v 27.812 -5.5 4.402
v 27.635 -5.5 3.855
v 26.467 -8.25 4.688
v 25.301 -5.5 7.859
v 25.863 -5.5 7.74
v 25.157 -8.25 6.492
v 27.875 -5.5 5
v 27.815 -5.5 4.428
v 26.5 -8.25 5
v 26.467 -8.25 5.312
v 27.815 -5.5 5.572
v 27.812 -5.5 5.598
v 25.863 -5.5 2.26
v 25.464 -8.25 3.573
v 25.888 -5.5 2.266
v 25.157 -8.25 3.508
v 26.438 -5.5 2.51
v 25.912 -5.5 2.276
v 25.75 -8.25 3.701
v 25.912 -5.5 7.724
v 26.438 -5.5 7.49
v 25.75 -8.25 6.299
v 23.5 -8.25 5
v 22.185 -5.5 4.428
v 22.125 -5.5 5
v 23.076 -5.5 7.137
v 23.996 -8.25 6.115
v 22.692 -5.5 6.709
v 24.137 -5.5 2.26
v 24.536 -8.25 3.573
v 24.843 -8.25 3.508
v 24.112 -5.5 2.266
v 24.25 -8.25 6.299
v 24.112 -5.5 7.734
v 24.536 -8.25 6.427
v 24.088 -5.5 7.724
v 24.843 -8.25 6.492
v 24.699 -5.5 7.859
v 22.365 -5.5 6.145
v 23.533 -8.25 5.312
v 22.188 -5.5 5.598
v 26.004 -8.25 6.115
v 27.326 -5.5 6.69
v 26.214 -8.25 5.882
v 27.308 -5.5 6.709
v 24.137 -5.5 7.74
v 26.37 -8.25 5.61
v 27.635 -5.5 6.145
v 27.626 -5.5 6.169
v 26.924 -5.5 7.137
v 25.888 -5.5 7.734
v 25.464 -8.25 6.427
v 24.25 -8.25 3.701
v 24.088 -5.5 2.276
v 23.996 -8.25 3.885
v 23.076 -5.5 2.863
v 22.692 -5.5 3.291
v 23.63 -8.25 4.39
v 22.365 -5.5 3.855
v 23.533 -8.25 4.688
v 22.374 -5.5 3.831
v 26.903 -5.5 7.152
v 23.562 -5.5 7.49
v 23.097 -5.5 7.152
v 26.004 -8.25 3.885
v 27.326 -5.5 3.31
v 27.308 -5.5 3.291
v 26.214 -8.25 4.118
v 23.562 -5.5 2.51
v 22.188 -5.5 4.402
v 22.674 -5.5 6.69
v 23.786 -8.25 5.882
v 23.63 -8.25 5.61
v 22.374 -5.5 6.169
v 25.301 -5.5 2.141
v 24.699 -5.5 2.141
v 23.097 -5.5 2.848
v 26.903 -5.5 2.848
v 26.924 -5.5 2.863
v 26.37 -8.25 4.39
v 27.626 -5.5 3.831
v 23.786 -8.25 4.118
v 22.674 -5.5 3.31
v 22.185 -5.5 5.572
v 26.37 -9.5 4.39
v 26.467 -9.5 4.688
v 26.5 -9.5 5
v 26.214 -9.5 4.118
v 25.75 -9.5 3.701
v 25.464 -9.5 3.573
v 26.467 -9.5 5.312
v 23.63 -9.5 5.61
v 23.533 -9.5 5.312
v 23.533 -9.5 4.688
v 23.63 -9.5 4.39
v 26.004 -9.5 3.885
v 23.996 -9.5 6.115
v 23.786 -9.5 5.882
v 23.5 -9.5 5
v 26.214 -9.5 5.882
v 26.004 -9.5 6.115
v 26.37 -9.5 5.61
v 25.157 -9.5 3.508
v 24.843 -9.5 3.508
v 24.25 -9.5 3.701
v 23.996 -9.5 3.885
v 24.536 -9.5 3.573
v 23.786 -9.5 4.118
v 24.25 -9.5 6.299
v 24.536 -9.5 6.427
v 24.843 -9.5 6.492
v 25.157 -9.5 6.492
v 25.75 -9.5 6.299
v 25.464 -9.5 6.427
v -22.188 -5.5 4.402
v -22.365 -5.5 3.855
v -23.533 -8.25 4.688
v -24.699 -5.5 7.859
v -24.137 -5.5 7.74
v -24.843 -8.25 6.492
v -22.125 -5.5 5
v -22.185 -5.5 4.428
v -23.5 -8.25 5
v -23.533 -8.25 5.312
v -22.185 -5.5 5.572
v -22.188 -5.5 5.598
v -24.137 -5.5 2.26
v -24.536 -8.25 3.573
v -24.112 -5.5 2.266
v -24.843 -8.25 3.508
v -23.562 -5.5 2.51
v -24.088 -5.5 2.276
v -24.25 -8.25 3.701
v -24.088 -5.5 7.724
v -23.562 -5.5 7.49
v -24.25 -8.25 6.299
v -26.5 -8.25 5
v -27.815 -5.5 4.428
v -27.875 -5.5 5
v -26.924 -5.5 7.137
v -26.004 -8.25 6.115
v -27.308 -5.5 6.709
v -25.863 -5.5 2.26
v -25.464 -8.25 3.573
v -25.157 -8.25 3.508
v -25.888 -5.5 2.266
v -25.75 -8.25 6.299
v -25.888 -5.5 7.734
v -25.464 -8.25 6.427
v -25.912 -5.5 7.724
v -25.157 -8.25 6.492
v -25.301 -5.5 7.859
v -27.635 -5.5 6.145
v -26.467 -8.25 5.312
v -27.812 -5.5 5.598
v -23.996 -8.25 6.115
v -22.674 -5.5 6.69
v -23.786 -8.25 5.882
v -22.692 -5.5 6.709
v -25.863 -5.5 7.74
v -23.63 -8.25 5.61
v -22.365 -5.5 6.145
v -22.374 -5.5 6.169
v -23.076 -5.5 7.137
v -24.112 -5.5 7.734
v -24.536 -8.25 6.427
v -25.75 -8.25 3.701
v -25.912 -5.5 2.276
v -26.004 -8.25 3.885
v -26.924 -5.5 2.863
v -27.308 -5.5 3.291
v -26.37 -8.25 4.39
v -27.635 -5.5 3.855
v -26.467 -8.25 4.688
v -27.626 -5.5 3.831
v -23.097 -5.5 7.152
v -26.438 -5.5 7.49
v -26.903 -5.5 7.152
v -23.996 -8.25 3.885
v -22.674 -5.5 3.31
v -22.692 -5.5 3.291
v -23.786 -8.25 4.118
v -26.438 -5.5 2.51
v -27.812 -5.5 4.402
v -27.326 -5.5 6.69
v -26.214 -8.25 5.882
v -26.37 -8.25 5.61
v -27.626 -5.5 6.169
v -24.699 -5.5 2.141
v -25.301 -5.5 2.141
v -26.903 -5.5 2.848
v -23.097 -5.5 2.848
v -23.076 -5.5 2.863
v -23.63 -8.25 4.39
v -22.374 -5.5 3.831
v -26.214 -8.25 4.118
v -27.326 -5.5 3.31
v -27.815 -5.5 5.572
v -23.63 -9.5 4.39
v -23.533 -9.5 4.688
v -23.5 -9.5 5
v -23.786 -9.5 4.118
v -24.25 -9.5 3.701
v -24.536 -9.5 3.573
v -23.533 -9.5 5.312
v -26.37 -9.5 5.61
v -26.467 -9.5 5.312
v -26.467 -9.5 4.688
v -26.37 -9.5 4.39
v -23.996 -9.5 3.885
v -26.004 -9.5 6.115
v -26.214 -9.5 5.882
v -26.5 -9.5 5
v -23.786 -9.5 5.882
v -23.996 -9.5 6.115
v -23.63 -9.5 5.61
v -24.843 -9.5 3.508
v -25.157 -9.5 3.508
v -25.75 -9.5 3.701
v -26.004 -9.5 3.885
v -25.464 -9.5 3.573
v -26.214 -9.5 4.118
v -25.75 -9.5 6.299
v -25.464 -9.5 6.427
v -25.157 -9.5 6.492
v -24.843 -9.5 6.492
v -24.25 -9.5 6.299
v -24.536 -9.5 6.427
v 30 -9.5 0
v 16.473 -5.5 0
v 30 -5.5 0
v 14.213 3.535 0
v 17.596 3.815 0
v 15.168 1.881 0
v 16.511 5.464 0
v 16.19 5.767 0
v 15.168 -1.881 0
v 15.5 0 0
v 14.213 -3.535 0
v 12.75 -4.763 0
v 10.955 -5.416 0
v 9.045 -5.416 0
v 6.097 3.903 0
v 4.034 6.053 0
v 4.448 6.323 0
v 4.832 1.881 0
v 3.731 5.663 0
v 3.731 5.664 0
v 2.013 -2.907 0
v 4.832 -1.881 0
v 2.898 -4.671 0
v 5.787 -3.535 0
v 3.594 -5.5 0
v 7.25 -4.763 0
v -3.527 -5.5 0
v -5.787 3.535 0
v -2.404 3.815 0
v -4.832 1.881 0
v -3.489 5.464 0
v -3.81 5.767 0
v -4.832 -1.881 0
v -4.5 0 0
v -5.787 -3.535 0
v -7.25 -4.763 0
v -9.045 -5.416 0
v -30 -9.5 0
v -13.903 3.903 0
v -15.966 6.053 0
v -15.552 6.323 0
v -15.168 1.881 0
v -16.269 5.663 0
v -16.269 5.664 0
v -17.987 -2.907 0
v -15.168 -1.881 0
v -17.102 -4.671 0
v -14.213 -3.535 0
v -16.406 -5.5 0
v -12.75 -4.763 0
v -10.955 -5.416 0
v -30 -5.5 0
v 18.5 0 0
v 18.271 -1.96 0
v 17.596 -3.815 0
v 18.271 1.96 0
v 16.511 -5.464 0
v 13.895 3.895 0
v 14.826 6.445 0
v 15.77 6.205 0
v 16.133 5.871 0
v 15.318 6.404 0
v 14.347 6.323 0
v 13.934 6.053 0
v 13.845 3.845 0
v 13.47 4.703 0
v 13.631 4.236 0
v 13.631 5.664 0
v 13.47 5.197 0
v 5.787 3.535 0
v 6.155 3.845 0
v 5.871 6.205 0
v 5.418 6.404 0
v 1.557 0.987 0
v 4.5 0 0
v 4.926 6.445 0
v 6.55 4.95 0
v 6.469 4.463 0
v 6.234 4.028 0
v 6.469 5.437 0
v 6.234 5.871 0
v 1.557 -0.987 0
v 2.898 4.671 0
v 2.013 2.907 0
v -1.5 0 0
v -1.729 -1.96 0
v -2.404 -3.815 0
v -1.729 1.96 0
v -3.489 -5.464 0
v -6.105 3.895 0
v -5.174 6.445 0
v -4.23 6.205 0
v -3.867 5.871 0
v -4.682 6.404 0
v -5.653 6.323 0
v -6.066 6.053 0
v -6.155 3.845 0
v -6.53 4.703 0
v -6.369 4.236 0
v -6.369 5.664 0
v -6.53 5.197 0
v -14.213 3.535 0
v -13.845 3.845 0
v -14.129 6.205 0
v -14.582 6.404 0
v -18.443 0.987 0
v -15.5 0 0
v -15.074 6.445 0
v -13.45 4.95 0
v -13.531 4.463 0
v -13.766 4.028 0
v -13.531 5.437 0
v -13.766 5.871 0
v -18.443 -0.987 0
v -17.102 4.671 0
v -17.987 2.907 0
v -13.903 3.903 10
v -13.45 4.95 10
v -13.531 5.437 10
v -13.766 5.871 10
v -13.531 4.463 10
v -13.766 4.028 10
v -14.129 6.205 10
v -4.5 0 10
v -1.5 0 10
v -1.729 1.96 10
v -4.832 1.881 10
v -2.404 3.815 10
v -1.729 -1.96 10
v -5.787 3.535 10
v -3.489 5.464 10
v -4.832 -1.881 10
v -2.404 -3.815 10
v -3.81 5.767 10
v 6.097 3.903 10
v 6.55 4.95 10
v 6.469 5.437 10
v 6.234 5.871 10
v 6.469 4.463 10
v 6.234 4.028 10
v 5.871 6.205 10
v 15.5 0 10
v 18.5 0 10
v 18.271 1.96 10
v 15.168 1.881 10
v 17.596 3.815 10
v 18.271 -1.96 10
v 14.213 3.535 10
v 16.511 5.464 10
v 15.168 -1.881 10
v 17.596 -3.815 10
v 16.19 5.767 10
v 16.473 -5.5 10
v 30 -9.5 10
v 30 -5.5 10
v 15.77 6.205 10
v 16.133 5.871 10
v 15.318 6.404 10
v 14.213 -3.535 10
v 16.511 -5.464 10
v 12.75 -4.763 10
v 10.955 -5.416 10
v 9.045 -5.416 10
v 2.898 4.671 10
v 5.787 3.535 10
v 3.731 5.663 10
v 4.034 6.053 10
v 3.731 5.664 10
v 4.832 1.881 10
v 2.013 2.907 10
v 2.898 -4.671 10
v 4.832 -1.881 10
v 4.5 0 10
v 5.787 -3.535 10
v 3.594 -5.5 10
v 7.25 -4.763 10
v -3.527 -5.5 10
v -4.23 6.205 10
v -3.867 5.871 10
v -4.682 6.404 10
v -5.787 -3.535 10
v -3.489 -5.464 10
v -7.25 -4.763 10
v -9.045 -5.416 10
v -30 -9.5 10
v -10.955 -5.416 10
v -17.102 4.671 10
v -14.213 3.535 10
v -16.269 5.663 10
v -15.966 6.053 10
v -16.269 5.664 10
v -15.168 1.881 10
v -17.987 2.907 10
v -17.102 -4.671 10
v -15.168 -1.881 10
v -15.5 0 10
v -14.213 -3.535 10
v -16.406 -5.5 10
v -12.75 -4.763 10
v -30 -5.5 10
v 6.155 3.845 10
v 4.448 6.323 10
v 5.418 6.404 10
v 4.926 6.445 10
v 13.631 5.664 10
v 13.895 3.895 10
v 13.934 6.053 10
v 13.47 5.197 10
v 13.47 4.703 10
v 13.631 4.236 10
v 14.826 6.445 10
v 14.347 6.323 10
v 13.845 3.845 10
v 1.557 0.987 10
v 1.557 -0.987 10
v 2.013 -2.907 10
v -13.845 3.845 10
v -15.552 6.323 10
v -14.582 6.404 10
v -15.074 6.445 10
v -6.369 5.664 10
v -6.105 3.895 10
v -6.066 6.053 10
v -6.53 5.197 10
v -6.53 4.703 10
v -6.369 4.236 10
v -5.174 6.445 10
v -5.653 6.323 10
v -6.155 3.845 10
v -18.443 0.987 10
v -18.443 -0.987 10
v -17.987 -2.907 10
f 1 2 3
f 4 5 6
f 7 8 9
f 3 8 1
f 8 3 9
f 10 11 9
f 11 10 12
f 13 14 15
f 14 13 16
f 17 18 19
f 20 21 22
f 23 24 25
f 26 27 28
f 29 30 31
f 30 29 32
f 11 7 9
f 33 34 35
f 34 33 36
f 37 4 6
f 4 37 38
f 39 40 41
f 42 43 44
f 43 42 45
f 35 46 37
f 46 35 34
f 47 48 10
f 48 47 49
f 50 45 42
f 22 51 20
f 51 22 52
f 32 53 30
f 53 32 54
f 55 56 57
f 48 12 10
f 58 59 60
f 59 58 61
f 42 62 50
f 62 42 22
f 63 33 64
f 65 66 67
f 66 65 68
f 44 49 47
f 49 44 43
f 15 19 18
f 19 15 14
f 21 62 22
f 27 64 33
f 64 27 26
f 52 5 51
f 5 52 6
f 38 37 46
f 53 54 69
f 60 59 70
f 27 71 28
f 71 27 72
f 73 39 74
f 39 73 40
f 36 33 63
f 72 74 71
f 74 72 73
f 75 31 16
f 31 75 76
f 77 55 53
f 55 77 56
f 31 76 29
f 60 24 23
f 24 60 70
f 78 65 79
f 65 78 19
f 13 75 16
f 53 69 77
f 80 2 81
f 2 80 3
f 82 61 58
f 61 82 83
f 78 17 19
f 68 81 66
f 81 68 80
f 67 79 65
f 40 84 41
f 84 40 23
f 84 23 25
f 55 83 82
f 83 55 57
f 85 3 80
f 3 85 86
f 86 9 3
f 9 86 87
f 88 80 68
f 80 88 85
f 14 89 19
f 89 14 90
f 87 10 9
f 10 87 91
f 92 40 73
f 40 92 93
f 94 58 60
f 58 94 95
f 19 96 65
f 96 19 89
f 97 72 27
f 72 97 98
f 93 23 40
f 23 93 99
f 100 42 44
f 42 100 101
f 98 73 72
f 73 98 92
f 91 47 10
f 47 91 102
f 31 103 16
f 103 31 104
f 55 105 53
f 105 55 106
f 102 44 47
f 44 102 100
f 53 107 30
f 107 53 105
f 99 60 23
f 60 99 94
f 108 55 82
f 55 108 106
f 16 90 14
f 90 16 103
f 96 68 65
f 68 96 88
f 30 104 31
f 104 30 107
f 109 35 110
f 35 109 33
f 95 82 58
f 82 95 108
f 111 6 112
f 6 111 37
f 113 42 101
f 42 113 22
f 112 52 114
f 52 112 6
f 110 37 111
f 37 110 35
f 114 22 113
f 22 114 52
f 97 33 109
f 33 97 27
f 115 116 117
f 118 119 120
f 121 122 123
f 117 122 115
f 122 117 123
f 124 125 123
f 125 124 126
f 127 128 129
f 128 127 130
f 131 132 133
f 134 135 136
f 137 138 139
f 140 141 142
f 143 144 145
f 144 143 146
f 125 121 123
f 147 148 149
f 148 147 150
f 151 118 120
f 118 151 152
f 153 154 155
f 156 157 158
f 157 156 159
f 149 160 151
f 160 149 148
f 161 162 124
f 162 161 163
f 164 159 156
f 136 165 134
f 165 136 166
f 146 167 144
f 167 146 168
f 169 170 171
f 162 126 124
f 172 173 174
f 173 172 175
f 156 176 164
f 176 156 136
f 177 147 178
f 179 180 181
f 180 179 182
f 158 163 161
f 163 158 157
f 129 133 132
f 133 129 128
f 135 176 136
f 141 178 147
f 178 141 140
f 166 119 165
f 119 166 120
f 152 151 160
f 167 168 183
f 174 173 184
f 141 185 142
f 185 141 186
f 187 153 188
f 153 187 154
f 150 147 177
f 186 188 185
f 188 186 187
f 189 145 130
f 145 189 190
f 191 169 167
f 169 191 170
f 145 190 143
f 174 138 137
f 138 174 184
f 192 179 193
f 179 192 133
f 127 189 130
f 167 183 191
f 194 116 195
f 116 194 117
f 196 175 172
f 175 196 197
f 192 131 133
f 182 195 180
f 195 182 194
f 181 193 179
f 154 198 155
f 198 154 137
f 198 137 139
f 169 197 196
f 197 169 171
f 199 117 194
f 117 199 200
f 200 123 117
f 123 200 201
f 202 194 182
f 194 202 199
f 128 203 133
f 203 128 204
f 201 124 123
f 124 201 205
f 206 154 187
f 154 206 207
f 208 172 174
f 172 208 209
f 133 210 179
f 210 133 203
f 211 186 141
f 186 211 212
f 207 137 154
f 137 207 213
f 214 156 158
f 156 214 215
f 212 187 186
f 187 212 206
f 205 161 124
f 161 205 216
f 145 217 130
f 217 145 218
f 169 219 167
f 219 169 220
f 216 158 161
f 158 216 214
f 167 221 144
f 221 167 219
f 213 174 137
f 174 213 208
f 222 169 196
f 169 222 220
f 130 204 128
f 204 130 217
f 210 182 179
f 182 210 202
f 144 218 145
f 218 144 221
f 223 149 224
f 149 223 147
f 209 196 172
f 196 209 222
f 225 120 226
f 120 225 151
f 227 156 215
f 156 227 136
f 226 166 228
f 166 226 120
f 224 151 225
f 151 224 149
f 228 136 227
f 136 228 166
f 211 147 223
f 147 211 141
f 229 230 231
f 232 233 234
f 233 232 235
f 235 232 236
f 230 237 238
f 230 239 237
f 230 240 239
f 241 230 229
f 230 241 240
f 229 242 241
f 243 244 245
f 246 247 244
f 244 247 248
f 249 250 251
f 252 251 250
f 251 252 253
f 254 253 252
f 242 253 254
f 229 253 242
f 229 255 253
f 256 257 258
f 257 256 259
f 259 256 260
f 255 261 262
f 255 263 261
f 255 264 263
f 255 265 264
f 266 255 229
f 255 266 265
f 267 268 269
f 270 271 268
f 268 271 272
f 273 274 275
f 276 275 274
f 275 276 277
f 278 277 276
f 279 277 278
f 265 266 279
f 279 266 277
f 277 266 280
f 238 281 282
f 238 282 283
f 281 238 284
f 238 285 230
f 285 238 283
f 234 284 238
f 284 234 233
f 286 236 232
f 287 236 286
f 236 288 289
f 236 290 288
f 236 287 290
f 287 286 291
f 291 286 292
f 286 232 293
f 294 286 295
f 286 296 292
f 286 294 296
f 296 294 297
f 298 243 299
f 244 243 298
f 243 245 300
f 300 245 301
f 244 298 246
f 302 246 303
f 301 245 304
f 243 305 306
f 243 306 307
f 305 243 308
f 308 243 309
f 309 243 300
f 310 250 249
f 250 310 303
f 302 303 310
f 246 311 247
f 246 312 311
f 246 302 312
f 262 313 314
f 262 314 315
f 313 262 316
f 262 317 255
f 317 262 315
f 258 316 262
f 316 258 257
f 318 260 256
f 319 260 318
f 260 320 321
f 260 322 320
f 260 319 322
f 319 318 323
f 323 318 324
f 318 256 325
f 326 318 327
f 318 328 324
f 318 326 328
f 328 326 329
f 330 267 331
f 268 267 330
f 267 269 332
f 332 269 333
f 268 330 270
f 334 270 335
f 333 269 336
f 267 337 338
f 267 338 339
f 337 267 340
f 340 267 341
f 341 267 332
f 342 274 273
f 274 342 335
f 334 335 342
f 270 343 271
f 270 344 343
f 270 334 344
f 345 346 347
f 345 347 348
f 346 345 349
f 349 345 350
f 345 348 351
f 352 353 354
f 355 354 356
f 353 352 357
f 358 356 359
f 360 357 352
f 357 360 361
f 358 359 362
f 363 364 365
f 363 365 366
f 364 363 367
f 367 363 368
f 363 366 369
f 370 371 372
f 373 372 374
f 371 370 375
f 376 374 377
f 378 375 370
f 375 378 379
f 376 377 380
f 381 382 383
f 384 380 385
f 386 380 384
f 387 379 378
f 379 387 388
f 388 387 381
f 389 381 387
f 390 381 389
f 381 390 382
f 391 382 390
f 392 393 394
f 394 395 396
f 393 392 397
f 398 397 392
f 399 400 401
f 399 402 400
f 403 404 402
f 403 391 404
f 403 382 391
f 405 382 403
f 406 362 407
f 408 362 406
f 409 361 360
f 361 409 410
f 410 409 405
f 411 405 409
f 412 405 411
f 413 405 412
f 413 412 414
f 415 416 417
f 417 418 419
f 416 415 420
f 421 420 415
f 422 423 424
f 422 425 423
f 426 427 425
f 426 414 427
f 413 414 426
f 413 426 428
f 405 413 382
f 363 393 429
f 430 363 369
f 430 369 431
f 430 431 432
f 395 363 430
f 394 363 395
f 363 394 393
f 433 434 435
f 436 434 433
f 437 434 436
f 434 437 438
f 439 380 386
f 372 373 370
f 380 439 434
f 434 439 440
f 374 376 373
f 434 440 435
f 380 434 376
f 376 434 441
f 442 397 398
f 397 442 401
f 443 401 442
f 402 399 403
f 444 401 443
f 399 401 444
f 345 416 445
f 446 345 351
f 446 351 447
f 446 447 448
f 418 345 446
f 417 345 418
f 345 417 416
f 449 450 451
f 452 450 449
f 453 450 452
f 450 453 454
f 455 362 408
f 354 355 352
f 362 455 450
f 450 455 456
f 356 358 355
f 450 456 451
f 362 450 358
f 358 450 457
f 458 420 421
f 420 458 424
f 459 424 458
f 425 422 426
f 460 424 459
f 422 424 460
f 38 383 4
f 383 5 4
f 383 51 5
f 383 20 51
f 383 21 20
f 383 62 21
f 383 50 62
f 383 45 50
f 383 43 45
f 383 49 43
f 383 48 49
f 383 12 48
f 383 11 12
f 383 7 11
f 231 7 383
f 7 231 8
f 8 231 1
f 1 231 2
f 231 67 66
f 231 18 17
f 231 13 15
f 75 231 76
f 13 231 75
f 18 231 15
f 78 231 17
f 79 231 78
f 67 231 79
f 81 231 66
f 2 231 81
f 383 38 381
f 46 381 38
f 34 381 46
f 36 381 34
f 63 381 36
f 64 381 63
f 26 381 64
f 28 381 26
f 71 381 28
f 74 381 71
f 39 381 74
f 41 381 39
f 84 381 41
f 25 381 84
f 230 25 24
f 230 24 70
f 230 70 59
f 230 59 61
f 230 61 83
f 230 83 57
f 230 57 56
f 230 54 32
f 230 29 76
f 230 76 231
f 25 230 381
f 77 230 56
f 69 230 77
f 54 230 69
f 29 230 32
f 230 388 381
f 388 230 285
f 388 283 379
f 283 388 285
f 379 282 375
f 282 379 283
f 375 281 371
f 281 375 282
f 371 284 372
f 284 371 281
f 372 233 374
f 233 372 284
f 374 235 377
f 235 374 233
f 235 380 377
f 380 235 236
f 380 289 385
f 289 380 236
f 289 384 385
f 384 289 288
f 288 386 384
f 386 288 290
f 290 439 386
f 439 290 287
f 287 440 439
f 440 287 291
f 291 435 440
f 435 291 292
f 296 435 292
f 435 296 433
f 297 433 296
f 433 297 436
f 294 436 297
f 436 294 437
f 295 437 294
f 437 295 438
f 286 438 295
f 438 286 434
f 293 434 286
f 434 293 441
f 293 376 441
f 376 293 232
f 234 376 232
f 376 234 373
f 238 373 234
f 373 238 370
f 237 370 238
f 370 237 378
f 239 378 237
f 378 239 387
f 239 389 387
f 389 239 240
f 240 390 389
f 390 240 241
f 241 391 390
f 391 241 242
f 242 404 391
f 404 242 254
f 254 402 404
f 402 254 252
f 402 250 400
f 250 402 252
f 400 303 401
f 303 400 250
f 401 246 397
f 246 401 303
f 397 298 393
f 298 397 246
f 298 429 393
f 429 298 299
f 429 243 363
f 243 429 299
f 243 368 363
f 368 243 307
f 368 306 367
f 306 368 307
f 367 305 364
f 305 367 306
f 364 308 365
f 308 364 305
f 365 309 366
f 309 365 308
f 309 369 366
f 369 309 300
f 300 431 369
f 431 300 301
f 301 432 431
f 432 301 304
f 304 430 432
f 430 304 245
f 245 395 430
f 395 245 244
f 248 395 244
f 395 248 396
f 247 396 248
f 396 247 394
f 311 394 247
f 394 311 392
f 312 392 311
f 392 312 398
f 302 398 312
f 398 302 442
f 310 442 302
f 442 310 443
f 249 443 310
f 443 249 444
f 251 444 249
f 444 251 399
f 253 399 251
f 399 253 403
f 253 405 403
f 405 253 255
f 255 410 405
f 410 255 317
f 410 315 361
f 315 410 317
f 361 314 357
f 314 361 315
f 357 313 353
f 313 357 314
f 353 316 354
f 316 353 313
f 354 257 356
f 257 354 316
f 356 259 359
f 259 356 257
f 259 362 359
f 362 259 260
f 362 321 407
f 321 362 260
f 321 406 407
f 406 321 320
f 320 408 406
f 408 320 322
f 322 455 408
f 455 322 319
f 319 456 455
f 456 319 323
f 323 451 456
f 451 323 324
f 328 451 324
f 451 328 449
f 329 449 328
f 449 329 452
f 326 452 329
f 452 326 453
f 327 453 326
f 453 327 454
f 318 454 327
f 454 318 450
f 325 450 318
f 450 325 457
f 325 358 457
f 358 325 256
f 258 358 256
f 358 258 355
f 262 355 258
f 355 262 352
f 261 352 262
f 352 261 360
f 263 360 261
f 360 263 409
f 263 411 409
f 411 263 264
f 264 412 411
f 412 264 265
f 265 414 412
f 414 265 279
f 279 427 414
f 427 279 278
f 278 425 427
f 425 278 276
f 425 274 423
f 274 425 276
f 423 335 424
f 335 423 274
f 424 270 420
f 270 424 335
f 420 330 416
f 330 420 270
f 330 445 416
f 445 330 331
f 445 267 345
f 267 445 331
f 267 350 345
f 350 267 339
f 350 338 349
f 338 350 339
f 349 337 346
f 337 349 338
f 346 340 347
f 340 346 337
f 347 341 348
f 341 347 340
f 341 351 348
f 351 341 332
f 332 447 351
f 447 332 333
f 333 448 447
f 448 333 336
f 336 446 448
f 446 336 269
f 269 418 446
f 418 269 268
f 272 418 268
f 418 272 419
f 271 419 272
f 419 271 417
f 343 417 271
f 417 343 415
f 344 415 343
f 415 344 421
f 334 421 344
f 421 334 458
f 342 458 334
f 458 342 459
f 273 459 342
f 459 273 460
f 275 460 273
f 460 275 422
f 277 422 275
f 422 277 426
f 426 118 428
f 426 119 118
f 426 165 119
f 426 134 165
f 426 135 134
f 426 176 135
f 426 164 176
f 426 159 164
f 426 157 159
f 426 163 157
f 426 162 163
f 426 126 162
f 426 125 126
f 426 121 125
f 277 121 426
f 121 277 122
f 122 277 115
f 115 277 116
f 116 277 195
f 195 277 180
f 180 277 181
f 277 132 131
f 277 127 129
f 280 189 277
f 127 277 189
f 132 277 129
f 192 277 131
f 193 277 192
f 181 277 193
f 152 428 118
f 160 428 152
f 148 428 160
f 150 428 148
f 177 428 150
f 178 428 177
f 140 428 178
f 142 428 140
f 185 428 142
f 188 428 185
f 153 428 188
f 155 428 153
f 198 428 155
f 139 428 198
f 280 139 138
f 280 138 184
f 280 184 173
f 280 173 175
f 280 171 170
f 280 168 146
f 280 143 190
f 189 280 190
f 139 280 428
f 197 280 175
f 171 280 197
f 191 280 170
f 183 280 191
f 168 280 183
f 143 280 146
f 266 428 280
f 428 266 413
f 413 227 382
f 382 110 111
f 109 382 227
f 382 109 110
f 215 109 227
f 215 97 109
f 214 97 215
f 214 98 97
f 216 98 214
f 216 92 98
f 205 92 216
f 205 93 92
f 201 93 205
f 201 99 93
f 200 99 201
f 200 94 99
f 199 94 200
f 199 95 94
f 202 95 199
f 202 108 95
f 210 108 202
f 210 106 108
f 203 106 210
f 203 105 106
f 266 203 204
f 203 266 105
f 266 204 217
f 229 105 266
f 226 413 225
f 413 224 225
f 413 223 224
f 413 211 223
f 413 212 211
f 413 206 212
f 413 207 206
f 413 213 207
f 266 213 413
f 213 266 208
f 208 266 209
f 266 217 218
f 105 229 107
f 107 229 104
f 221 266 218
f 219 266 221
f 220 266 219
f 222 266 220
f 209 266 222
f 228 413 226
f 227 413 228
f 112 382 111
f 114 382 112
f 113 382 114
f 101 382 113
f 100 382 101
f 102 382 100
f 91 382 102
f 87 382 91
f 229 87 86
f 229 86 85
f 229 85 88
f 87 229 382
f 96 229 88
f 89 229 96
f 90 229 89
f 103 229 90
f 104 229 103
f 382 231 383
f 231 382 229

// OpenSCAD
module hanger(Rin,Rex,Xc,Yc)
{
   c = Rex / sqrt(2);
   translate([Xc,Yc,0]){
	   difference(){
		   circle(r=Rex);
		   circle(r=Rin);
		   polygon(points = [[0,0],[c,c],[0,2*c],[-c,c]]);
	   }
	   translate([  (Rex + Rin)/(2*sqrt(2)),(Rex + Rin)/(2*sqrt(2)),0  ]) {
	   circle(r = (Rex-Rin)/2, $fs = 0.5);
	   }
	   translate([  -(Rex + Rin)/(2*sqrt(2)),(Rex + Rin)/(2*sqrt(2)),0  ]) {
	   circle(r = (Rex-Rin)/2, $fs = 0.5);
	   }
   }
}

   difference(){
   linear_extrude(height = 10)
   union(){
      translate([0,-7.5,0]) {square([60,4], center=true);}
      hanger(5.5, 8.5, 10, 0);
      hanger(5.5, 8.5, -10, 0);
   }

   translate([25,-8.25,5]){
      rotate(a = -90, v = [1, 0, 0]) {
         union(){
            cylinder(h = 3, r1 = 1.5, r2 = 3, center = false, $fs = 0.2);
            translate([0,0,-2]){
               cylinder(h = 2, r = 1.5, center=false, $fs = 0.2);
            }
         }
      }
   }

   translate([-25,-8.25,5]){
      rotate(a = -90, v = [1, 0, 0]) {
         union(){
            cylinder(h = 3, r1 = 1.5, r2 = 3, center = false, $fs = 0.2);
            translate([0,0,-2]){
               cylinder(h = 2, r = 1.5, center=false, $fs = 0.2);
            }
         }
      }
   }
}
